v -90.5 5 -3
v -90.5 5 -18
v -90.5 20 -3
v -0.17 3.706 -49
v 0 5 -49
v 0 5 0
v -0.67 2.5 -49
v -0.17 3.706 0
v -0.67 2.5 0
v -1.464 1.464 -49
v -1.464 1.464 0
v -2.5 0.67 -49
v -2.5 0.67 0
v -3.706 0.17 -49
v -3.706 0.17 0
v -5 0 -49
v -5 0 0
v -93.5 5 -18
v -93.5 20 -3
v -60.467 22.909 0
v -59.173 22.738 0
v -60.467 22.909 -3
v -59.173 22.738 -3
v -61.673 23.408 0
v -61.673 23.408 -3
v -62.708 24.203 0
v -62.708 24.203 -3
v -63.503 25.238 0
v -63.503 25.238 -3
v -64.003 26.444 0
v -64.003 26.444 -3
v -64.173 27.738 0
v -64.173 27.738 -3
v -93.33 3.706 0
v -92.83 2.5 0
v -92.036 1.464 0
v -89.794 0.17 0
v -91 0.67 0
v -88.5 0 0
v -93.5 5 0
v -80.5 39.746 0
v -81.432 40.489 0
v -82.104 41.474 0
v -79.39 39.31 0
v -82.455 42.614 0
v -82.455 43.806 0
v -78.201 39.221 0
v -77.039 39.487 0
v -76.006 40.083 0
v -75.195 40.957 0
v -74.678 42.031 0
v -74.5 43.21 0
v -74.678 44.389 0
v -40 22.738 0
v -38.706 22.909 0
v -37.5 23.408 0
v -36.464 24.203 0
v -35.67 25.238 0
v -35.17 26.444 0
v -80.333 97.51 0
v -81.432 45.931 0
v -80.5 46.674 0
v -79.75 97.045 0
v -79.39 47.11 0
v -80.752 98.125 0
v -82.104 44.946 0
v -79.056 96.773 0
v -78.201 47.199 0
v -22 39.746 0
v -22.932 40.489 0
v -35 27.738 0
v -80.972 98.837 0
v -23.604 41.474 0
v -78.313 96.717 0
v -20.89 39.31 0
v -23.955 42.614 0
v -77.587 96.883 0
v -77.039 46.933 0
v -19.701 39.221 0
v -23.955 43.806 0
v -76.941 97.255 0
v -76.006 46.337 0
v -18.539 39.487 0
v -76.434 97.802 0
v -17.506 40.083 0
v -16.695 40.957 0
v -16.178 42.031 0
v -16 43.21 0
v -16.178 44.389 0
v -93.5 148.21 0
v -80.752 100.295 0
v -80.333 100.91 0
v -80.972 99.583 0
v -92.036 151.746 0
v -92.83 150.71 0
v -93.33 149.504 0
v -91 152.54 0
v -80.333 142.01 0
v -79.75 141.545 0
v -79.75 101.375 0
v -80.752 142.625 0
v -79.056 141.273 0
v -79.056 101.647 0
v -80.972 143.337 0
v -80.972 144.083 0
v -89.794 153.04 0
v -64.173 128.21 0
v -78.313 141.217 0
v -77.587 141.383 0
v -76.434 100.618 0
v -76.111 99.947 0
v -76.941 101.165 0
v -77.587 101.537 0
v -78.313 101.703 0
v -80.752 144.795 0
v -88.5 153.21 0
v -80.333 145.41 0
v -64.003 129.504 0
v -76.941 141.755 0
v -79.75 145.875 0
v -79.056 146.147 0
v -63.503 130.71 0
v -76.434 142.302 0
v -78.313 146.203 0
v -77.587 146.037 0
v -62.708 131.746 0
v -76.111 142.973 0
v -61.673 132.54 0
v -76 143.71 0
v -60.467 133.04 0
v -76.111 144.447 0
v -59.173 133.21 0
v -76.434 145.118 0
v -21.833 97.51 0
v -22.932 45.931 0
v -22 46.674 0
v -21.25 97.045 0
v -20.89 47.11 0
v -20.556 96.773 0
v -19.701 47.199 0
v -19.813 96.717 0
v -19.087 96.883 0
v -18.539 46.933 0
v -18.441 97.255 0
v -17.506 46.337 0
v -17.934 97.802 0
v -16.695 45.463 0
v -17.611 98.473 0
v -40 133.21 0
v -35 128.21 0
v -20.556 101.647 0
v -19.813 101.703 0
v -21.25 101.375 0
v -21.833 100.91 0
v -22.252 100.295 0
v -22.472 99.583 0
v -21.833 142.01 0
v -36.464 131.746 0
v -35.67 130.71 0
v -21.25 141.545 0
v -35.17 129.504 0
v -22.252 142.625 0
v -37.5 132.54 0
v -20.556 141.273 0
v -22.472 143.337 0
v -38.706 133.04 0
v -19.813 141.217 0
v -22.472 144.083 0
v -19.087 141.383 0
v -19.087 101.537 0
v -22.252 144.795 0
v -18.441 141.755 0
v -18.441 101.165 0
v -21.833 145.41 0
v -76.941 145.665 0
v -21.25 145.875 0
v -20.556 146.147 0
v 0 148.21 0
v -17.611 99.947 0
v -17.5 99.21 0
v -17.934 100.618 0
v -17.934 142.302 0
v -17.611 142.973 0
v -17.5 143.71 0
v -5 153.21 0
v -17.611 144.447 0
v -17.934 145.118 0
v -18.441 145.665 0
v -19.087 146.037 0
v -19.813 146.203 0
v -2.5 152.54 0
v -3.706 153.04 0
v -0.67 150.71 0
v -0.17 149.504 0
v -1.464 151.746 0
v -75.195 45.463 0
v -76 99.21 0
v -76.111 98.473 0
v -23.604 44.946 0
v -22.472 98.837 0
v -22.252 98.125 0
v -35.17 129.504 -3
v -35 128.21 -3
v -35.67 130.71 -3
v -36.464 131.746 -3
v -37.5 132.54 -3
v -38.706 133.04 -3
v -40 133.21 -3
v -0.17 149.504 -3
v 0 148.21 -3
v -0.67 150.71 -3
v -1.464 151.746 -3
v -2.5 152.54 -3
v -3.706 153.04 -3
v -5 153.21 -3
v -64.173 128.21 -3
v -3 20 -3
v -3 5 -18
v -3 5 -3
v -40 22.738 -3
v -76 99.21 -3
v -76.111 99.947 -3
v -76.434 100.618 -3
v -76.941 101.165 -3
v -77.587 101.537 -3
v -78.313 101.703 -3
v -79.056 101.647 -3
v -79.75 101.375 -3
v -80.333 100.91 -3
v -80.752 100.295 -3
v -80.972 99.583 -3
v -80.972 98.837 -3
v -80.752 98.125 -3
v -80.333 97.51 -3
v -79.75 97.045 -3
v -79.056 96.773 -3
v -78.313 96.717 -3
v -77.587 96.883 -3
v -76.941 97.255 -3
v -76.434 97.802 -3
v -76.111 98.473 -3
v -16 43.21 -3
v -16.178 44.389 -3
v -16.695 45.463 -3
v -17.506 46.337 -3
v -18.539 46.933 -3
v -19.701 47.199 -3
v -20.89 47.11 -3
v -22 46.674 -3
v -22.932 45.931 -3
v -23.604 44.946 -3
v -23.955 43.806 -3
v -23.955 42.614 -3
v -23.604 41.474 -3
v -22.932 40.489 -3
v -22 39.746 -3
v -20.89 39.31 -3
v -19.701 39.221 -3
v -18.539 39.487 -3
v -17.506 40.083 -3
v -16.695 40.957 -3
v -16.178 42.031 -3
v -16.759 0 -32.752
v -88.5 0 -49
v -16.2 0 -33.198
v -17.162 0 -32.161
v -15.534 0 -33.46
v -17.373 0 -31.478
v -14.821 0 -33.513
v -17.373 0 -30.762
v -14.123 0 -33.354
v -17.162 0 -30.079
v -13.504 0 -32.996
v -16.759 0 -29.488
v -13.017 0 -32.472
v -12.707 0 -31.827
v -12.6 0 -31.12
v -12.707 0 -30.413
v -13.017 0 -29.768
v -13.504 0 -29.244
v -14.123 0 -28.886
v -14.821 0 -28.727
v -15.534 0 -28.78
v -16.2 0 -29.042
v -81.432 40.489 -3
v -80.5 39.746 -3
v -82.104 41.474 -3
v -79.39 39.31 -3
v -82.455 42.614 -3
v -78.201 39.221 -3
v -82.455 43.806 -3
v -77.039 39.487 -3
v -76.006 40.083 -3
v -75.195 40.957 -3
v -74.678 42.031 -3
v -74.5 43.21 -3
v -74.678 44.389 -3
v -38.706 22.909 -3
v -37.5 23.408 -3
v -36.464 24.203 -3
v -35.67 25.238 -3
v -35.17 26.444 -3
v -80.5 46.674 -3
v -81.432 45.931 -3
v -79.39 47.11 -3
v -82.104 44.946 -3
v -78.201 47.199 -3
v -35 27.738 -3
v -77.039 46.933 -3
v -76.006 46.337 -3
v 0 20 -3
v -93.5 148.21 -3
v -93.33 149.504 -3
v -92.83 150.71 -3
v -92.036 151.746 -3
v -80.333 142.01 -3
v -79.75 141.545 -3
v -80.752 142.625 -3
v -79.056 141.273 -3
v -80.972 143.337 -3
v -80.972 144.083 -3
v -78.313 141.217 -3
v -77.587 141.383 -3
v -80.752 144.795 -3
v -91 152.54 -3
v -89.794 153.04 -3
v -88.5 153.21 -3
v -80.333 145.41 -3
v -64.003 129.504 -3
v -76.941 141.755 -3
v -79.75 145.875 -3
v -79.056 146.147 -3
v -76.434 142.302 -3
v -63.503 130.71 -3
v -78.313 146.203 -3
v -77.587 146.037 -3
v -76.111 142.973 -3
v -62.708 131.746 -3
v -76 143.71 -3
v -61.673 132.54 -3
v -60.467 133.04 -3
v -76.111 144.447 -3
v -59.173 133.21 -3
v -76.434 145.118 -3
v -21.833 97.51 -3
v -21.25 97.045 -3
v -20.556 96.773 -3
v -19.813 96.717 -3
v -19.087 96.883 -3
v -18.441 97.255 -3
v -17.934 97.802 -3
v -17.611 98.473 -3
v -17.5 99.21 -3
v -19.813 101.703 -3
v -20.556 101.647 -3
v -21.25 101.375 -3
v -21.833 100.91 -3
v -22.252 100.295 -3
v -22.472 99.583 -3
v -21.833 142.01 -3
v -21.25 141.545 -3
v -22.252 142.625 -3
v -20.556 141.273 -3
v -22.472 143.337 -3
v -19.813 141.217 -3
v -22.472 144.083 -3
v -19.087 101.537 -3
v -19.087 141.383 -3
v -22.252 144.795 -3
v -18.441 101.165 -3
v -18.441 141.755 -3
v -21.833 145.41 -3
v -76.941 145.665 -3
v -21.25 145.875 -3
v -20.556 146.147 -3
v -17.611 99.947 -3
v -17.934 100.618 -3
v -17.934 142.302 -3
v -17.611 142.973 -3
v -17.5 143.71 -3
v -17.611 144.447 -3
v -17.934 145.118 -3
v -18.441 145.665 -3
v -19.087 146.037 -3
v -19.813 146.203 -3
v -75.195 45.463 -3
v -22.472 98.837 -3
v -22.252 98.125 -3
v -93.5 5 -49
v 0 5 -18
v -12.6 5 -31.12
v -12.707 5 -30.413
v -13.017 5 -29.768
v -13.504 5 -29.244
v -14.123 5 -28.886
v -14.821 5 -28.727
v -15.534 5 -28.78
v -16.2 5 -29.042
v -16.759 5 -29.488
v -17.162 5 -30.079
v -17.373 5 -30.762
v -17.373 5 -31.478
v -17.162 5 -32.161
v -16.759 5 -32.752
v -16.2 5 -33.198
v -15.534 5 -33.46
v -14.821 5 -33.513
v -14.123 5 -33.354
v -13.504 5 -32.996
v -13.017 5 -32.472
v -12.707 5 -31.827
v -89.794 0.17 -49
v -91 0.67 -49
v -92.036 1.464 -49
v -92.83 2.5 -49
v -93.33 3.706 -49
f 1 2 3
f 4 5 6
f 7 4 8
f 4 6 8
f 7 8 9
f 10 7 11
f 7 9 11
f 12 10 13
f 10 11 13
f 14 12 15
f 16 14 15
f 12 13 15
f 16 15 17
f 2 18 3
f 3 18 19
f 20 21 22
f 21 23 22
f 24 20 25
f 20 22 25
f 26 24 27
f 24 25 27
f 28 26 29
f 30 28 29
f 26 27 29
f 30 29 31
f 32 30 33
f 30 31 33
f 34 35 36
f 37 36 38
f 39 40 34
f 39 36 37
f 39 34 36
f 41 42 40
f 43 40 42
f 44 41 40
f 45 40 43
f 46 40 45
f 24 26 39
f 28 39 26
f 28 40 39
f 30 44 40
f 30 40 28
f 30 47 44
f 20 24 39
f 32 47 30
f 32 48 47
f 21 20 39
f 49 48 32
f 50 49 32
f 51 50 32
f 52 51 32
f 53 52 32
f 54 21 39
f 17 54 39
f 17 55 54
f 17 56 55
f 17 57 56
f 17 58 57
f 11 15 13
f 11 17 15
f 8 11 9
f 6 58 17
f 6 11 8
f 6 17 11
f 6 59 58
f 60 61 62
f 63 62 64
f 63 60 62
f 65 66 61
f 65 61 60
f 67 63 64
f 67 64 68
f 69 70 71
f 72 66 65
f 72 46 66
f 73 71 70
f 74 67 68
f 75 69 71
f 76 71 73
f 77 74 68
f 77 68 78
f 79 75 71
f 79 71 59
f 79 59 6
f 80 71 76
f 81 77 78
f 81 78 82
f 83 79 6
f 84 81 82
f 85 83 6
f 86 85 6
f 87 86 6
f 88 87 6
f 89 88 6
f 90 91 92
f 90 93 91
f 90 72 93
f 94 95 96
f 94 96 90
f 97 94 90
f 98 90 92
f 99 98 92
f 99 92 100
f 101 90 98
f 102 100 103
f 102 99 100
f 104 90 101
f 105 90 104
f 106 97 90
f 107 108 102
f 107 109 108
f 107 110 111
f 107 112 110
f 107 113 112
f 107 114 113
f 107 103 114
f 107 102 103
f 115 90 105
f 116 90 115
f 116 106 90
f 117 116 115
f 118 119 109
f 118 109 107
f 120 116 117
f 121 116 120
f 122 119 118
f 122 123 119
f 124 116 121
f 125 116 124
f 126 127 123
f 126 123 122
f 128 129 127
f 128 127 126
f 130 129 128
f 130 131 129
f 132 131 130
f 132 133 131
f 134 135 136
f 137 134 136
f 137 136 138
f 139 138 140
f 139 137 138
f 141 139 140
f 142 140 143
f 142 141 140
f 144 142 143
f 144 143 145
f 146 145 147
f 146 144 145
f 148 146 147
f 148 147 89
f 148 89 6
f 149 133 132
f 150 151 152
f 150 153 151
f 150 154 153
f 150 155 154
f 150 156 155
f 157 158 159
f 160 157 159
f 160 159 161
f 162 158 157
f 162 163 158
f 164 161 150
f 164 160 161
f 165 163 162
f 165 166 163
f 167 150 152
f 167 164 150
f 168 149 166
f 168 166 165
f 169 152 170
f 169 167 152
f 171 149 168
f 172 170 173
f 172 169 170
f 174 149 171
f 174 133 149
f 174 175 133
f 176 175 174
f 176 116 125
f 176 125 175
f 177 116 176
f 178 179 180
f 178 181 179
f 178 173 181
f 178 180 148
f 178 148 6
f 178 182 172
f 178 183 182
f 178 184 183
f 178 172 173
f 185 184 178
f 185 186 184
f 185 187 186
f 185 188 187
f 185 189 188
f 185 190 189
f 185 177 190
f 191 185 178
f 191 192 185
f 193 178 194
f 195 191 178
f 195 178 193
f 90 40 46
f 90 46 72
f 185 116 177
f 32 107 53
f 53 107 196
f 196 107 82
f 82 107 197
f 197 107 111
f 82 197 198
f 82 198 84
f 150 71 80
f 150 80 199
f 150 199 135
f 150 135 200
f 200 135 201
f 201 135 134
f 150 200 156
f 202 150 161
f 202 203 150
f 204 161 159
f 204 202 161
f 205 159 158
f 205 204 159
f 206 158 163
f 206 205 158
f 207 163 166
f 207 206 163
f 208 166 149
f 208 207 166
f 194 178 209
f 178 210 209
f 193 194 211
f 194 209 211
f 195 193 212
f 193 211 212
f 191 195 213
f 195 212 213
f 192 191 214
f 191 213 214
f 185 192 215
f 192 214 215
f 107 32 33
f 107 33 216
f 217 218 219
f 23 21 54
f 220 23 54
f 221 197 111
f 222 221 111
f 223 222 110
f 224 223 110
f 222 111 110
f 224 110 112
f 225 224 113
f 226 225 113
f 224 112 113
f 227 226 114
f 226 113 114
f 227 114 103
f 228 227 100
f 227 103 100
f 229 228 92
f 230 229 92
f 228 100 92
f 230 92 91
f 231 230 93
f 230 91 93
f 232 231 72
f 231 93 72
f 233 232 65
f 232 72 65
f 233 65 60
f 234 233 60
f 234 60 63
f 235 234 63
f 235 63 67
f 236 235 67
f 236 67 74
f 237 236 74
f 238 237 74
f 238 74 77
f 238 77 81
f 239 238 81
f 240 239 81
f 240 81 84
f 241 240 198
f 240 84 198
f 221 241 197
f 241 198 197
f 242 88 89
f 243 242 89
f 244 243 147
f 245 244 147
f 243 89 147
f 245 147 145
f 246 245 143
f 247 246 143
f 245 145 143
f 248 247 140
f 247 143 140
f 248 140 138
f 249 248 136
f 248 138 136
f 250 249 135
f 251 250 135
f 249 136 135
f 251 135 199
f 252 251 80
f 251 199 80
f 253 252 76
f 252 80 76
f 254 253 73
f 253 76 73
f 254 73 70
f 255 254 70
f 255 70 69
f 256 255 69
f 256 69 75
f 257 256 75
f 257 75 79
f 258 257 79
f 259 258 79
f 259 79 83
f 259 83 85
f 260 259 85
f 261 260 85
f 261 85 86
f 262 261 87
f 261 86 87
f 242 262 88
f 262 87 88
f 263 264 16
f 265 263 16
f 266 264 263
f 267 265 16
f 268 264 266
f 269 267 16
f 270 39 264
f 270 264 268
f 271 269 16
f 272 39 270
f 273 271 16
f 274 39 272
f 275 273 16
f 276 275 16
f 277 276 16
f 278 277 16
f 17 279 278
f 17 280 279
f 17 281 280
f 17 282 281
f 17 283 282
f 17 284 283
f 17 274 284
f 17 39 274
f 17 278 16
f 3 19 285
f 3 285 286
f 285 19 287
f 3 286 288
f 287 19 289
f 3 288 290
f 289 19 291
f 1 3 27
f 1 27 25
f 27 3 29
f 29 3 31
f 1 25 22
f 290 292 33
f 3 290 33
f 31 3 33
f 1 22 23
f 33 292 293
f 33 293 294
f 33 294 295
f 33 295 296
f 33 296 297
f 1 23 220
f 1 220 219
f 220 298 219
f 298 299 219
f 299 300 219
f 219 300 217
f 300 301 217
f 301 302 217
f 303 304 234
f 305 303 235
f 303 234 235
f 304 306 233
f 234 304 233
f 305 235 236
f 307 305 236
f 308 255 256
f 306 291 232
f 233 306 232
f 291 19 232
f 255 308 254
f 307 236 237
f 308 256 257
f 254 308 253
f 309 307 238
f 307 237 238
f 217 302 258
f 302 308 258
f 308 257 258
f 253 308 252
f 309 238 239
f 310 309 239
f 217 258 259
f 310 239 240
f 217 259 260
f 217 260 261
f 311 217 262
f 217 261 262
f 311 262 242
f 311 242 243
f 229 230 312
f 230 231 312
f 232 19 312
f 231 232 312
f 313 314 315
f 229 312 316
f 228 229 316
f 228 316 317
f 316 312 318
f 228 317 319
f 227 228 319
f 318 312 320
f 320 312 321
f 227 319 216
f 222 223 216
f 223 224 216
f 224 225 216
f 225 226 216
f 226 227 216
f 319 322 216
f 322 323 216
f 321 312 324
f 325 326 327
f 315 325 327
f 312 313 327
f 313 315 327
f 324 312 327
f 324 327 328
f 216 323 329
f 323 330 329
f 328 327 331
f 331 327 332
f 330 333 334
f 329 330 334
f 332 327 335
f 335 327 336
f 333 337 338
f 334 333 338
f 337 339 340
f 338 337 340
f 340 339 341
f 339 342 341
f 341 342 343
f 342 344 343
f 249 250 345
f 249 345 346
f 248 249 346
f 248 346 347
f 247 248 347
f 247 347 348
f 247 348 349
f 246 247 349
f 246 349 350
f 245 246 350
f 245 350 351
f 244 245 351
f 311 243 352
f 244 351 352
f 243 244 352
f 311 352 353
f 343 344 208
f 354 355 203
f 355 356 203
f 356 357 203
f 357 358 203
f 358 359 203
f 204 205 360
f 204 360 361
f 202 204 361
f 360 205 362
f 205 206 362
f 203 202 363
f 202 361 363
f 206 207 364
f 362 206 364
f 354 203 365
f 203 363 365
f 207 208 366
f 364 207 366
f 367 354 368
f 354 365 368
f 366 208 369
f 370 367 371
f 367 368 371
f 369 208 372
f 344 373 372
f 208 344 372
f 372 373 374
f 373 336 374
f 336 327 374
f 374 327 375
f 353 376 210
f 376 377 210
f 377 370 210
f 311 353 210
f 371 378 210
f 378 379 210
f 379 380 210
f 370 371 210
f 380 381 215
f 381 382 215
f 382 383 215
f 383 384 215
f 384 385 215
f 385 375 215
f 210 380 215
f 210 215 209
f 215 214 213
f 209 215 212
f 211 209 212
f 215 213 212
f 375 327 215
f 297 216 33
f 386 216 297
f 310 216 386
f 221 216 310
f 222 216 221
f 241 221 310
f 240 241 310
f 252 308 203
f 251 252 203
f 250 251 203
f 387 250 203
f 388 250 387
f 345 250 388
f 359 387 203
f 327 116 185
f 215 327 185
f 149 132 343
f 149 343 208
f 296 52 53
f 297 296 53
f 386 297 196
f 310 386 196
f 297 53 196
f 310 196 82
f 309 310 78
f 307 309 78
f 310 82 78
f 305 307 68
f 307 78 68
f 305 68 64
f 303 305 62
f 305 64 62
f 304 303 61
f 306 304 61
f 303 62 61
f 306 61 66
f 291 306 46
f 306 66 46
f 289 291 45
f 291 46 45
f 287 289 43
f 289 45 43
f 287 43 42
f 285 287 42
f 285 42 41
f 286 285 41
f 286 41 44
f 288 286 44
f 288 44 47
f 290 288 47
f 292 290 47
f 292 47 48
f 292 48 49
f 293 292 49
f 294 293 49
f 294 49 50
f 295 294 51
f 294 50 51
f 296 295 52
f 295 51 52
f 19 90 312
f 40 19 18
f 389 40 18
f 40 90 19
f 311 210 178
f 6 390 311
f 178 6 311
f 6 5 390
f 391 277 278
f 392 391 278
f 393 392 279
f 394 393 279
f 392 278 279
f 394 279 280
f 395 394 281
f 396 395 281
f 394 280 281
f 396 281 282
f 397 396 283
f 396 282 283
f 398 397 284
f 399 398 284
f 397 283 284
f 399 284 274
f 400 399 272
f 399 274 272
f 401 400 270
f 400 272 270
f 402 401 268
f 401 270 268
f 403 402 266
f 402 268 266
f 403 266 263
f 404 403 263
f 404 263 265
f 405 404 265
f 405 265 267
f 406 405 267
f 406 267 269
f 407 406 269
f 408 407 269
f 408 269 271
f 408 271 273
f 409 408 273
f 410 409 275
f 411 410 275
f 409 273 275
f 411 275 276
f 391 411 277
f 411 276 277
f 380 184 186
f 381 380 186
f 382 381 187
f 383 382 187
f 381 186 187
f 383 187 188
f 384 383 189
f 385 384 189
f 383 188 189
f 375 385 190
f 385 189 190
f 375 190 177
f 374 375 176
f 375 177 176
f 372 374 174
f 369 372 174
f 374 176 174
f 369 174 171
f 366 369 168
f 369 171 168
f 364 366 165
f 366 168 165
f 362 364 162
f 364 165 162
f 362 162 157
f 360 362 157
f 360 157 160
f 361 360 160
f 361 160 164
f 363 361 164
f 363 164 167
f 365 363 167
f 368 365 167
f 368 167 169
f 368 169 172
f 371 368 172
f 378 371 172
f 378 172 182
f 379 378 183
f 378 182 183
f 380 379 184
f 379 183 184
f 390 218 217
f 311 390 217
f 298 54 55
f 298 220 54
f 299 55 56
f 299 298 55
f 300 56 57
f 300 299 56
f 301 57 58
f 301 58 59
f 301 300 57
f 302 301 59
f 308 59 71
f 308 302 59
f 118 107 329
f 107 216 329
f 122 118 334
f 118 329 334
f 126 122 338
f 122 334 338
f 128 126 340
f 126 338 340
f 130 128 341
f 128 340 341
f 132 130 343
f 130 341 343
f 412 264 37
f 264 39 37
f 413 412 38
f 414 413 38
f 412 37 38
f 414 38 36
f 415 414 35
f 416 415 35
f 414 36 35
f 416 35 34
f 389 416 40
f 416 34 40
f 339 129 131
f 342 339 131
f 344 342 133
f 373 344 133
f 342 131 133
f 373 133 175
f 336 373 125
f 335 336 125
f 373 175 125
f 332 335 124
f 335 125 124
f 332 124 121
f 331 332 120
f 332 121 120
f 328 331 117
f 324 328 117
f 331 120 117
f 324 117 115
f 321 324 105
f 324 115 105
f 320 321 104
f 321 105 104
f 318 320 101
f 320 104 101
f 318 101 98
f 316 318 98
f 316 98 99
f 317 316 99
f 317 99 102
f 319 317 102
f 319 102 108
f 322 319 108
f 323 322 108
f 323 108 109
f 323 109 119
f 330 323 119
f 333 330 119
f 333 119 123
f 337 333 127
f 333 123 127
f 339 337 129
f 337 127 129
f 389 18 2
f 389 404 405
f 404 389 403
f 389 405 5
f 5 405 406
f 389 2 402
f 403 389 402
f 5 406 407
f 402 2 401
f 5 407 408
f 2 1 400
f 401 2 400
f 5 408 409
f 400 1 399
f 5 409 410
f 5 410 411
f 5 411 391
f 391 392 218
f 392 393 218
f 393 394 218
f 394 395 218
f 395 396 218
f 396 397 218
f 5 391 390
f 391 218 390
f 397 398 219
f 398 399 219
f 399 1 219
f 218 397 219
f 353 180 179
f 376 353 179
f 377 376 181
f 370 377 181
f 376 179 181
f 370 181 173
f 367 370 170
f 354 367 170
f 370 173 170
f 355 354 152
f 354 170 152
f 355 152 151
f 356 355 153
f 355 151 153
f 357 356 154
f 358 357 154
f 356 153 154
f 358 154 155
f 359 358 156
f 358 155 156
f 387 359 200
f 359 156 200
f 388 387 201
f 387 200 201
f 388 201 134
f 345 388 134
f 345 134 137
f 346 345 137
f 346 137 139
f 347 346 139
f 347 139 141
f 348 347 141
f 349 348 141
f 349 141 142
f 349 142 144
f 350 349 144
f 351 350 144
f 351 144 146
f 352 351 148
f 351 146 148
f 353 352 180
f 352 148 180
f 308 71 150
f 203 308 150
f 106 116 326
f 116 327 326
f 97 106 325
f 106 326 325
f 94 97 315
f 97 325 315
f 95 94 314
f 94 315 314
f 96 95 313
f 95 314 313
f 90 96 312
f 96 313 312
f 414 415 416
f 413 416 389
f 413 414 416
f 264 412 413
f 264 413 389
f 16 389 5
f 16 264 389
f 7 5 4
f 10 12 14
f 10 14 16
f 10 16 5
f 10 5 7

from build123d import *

# Parameters (mm, degrees)
F0_W     = 93.5
F0_H     = 153.21
F0_R     = 4
F0_R_2   = 2.5
F0_W_2   = 29.1728788614
F0_H_2   = 110.4717357084
F1_DEPTH = 3
F2_W     = 93.5
F2_H     = 5
F3_DEPTH = 46
F4_R     = 2.4
F5_DEPTH = 5
F6_W     = 3
F6_H     = 15
F7_DEPTH = 15
F9_DEPTH = 93.501
F10_R    = 4.99999


# Not quite as in the source:
# - a fillet or chamfer is up to 0.001 mm smaller than in the source, because OpenCascade refuses the exact size


with BuildPart() as f1:
    # F0 (on Top) → F1 (new body)
    with BuildSketch(Plane.XY):
        with Locations((-46.75, 76.605)):
            Rectangle(F0_W, F0_H)
        with Locations((-78.5, 43.21)):
            Circle(F0_R, mode=Mode.SUBTRACT)
        with Locations((-20, 43.21)):
            Circle(F0_R, mode=Mode.SUBTRACT)
        with Locations((-78.5, 99.21)):
            Circle(F0_R_2, mode=Mode.SUBTRACT)
        with Locations((-49.5864394307, 77.9741321458)):
            Rectangle(F0_W_2, F0_H_2, mode=Mode.SUBTRACT)
        with Locations((-78.5, 143.71)):
            Circle(F0_R_2, mode=Mode.SUBTRACT)
        with Locations((-20, 99.21)):
            Circle(F0_R_2, mode=Mode.SUBTRACT)
        with Locations((-20, 143.71)):
            Circle(F0_R_2, mode=Mode.SUBTRACT)
    extrude(amount=-F1_DEPTH)

    # F2 (on face) → F3 (join)
    with BuildSketch(Plane(origin=(0, 0, -3), x_dir=(1, 0, 0), z_dir=(0, 0, -1))):
        with Locations((-46.75, -2.5)):
            Rectangle(F2_W, F2_H)
    extrude(amount=F3_DEPTH)

    # F4 (on face) → F5 (cut, through all)
    with BuildSketch(Plane.XZ):
        with Locations((-15, -31.12)):
            Circle(F4_R)
    extrude(amount=-F5_DEPTH, mode=Mode.SUBTRACT)

    # F6 (on face) → F7 (join)
    with BuildSketch(Plane(origin=(0, 5, 0), x_dir=(-1, 0, 0), z_dir=(0, 1, 0))):
        with Locations((1.5, -10.5)):
            Rectangle(F6_W, F6_H)
        with Locations((92, -10.5)):
            Rectangle(F6_W, F6_H)
    extrude(amount=F7_DEPTH)

    # F8 (on face) → F9 (cut, through all)
    with BuildSketch(Plane(origin=(-93.5, 0, 0), x_dir=(0, -1, 0), z_dir=(-1, 0, 0))):
        Polygon((-5, -18), (-20, -3), (-20, -18), align=None)
    extrude(amount=-F9_DEPTH, mode=Mode.SUBTRACT)

    # F10 (radius 5 in the source; OpenCascade refuses exactly that, so slightly less here)
    f10_edges = [f1.edges().sort_by_distance(p)[0] for p in [
        (0, 153.21, -1.5),
        (-93.5, 153.21, -1.5),
        (0, 0, -24.5),
        (-93.5, 0, -24.5),
        (-64.172879, 133.21, -1.5),
        (-64.172879, 22.738264, -1.5),
        (-35, 22.738264, -1.5),
        (-35, 133.21, -1.5),
    ]]
    fillet(f10_edges, radius=F10_R)


solid = f1.part
